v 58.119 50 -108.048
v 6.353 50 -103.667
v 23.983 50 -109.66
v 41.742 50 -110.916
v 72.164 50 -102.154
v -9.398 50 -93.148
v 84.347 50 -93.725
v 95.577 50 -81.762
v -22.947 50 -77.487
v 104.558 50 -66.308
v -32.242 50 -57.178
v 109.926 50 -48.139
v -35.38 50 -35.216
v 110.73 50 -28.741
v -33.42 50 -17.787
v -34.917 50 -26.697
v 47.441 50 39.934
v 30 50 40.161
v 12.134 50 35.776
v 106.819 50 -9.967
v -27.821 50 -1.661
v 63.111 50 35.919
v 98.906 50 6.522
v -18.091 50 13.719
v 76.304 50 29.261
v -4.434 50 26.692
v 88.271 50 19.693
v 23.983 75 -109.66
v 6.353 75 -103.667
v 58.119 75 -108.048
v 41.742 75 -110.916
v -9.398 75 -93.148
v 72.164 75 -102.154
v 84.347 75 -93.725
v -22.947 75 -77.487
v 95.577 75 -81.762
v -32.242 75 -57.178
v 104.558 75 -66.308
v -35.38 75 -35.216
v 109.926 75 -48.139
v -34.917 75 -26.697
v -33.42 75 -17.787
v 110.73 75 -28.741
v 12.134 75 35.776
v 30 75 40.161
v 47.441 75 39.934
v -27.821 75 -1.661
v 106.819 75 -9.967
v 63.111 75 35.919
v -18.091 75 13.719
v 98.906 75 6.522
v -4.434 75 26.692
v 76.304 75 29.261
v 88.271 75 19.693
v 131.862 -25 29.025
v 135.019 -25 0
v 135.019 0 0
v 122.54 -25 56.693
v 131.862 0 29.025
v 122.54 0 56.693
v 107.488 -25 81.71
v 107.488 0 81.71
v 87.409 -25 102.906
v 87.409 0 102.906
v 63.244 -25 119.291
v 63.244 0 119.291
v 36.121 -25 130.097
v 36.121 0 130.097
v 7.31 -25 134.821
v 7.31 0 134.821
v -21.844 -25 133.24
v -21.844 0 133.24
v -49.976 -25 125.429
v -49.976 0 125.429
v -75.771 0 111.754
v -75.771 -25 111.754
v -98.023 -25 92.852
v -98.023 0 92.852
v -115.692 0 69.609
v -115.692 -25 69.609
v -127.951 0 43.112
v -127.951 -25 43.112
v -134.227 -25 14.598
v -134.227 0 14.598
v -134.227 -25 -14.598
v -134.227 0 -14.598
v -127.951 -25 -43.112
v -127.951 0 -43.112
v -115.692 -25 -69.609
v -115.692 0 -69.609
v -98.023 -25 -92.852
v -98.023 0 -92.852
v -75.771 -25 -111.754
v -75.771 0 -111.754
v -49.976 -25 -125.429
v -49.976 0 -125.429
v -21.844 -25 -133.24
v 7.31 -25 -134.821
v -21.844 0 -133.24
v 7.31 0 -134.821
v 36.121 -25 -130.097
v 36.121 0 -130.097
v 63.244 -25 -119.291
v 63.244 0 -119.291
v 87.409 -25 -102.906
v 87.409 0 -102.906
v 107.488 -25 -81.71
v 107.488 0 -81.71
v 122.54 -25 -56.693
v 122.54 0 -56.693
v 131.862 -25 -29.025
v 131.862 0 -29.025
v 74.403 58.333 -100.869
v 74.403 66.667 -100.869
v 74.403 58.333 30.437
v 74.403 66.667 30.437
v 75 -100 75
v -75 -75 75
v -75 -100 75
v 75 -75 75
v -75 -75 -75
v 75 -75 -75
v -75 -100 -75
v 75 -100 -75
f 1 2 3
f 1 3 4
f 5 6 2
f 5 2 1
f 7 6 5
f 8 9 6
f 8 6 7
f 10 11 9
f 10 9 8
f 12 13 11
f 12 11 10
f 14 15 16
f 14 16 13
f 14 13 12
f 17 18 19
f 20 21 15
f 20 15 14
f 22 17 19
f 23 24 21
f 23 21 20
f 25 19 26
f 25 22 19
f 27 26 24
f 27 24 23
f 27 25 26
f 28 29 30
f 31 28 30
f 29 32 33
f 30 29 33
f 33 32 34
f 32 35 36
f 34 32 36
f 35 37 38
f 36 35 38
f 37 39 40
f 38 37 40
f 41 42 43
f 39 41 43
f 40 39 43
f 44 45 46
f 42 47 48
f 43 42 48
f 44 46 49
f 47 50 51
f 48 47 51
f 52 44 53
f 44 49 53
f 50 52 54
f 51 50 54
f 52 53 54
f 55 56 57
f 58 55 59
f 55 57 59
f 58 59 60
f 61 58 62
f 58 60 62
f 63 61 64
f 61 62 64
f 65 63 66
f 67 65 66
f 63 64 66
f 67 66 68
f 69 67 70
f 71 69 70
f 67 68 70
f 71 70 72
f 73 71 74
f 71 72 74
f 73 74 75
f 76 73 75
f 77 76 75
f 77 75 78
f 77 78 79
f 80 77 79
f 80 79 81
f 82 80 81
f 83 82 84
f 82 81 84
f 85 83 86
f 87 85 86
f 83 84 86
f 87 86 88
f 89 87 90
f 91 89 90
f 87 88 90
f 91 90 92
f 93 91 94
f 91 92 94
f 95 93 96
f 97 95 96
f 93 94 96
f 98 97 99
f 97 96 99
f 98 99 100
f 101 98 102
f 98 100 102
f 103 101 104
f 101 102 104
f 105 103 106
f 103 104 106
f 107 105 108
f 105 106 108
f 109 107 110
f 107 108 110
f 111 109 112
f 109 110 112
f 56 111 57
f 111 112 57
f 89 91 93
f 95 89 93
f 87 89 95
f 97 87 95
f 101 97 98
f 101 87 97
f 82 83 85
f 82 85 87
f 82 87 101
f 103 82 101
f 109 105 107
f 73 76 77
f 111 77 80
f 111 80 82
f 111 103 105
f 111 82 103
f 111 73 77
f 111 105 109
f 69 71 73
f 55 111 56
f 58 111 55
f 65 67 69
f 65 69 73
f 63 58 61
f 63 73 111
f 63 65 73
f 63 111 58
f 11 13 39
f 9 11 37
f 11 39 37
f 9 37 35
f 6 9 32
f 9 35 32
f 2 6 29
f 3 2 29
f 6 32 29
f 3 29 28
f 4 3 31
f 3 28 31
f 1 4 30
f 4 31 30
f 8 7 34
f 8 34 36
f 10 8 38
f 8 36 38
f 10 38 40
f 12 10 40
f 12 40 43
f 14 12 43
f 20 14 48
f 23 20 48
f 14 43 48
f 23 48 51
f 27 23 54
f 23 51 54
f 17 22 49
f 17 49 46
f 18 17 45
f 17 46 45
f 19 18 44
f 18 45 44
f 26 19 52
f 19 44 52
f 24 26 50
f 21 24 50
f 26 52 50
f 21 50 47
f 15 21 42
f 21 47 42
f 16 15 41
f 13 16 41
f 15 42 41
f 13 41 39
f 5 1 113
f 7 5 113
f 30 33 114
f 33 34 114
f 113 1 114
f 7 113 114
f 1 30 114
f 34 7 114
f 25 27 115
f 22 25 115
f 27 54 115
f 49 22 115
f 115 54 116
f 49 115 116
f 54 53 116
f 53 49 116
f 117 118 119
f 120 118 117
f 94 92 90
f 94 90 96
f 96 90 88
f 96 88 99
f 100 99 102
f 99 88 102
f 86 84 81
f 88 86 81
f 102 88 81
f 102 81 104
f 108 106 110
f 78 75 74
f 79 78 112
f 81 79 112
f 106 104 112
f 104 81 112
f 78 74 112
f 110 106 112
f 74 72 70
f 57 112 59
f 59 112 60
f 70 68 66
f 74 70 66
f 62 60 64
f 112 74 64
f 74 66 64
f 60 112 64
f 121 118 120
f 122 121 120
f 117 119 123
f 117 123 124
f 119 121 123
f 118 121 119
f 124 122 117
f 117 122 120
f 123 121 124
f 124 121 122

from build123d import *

# Parameters (mm, degrees)
F2_W     = 150
F2_H     = 150
F5_DEPTH = 25.0000003725
F3_R     = 135.0187980494


with BuildPart() as f5:
    # F2 (on offset) → F5 (new body)
    with BuildSketch(Plane.XZ.offset(75)):
        Rectangle(F2_W, F2_H)
    extrude(amount=F5_DEPTH)


with BuildPart() as f5b:
    # F3 (on Front) → F5, piece 2 (new body)
    with BuildSketch(Plane.XZ):
        Circle(F3_R)
    extrude(amount=F5_DEPTH)


with BuildPart() as f5c:
    # F4 (on offset) → F5, piece 3 (new body)
    with BuildSketch(Plane.XZ.offset(-75)):
        with BuildLine():
            add(Edge.make_bspline(
                [(-35.3803634644, -35.2156162262), (-35.3803634644, -166.5215816961), (74.4028091431, -100.8685989611), (184.1859817505, -35.2156162262), (74.4028091431, 30.4373665087), (-35.3803634644, 96.0903492437), (-35.3803634644, -35.2156162262)],
                knots=[4.7123889804, 4.7123889804, 4.7123889804, 6.8067840828, 6.8067840828, 8.9011791852, 8.9011791852, 10.9955742876, 10.9955742876, 10.9955742876], degree=2, weights=[1, 0.5, 1, 0.5, 1, 0.5, 1]))
        make_face()
    extrude(amount=F5_DEPTH)


solid = Compound([f5.part, f5b.part, f5c.part])
